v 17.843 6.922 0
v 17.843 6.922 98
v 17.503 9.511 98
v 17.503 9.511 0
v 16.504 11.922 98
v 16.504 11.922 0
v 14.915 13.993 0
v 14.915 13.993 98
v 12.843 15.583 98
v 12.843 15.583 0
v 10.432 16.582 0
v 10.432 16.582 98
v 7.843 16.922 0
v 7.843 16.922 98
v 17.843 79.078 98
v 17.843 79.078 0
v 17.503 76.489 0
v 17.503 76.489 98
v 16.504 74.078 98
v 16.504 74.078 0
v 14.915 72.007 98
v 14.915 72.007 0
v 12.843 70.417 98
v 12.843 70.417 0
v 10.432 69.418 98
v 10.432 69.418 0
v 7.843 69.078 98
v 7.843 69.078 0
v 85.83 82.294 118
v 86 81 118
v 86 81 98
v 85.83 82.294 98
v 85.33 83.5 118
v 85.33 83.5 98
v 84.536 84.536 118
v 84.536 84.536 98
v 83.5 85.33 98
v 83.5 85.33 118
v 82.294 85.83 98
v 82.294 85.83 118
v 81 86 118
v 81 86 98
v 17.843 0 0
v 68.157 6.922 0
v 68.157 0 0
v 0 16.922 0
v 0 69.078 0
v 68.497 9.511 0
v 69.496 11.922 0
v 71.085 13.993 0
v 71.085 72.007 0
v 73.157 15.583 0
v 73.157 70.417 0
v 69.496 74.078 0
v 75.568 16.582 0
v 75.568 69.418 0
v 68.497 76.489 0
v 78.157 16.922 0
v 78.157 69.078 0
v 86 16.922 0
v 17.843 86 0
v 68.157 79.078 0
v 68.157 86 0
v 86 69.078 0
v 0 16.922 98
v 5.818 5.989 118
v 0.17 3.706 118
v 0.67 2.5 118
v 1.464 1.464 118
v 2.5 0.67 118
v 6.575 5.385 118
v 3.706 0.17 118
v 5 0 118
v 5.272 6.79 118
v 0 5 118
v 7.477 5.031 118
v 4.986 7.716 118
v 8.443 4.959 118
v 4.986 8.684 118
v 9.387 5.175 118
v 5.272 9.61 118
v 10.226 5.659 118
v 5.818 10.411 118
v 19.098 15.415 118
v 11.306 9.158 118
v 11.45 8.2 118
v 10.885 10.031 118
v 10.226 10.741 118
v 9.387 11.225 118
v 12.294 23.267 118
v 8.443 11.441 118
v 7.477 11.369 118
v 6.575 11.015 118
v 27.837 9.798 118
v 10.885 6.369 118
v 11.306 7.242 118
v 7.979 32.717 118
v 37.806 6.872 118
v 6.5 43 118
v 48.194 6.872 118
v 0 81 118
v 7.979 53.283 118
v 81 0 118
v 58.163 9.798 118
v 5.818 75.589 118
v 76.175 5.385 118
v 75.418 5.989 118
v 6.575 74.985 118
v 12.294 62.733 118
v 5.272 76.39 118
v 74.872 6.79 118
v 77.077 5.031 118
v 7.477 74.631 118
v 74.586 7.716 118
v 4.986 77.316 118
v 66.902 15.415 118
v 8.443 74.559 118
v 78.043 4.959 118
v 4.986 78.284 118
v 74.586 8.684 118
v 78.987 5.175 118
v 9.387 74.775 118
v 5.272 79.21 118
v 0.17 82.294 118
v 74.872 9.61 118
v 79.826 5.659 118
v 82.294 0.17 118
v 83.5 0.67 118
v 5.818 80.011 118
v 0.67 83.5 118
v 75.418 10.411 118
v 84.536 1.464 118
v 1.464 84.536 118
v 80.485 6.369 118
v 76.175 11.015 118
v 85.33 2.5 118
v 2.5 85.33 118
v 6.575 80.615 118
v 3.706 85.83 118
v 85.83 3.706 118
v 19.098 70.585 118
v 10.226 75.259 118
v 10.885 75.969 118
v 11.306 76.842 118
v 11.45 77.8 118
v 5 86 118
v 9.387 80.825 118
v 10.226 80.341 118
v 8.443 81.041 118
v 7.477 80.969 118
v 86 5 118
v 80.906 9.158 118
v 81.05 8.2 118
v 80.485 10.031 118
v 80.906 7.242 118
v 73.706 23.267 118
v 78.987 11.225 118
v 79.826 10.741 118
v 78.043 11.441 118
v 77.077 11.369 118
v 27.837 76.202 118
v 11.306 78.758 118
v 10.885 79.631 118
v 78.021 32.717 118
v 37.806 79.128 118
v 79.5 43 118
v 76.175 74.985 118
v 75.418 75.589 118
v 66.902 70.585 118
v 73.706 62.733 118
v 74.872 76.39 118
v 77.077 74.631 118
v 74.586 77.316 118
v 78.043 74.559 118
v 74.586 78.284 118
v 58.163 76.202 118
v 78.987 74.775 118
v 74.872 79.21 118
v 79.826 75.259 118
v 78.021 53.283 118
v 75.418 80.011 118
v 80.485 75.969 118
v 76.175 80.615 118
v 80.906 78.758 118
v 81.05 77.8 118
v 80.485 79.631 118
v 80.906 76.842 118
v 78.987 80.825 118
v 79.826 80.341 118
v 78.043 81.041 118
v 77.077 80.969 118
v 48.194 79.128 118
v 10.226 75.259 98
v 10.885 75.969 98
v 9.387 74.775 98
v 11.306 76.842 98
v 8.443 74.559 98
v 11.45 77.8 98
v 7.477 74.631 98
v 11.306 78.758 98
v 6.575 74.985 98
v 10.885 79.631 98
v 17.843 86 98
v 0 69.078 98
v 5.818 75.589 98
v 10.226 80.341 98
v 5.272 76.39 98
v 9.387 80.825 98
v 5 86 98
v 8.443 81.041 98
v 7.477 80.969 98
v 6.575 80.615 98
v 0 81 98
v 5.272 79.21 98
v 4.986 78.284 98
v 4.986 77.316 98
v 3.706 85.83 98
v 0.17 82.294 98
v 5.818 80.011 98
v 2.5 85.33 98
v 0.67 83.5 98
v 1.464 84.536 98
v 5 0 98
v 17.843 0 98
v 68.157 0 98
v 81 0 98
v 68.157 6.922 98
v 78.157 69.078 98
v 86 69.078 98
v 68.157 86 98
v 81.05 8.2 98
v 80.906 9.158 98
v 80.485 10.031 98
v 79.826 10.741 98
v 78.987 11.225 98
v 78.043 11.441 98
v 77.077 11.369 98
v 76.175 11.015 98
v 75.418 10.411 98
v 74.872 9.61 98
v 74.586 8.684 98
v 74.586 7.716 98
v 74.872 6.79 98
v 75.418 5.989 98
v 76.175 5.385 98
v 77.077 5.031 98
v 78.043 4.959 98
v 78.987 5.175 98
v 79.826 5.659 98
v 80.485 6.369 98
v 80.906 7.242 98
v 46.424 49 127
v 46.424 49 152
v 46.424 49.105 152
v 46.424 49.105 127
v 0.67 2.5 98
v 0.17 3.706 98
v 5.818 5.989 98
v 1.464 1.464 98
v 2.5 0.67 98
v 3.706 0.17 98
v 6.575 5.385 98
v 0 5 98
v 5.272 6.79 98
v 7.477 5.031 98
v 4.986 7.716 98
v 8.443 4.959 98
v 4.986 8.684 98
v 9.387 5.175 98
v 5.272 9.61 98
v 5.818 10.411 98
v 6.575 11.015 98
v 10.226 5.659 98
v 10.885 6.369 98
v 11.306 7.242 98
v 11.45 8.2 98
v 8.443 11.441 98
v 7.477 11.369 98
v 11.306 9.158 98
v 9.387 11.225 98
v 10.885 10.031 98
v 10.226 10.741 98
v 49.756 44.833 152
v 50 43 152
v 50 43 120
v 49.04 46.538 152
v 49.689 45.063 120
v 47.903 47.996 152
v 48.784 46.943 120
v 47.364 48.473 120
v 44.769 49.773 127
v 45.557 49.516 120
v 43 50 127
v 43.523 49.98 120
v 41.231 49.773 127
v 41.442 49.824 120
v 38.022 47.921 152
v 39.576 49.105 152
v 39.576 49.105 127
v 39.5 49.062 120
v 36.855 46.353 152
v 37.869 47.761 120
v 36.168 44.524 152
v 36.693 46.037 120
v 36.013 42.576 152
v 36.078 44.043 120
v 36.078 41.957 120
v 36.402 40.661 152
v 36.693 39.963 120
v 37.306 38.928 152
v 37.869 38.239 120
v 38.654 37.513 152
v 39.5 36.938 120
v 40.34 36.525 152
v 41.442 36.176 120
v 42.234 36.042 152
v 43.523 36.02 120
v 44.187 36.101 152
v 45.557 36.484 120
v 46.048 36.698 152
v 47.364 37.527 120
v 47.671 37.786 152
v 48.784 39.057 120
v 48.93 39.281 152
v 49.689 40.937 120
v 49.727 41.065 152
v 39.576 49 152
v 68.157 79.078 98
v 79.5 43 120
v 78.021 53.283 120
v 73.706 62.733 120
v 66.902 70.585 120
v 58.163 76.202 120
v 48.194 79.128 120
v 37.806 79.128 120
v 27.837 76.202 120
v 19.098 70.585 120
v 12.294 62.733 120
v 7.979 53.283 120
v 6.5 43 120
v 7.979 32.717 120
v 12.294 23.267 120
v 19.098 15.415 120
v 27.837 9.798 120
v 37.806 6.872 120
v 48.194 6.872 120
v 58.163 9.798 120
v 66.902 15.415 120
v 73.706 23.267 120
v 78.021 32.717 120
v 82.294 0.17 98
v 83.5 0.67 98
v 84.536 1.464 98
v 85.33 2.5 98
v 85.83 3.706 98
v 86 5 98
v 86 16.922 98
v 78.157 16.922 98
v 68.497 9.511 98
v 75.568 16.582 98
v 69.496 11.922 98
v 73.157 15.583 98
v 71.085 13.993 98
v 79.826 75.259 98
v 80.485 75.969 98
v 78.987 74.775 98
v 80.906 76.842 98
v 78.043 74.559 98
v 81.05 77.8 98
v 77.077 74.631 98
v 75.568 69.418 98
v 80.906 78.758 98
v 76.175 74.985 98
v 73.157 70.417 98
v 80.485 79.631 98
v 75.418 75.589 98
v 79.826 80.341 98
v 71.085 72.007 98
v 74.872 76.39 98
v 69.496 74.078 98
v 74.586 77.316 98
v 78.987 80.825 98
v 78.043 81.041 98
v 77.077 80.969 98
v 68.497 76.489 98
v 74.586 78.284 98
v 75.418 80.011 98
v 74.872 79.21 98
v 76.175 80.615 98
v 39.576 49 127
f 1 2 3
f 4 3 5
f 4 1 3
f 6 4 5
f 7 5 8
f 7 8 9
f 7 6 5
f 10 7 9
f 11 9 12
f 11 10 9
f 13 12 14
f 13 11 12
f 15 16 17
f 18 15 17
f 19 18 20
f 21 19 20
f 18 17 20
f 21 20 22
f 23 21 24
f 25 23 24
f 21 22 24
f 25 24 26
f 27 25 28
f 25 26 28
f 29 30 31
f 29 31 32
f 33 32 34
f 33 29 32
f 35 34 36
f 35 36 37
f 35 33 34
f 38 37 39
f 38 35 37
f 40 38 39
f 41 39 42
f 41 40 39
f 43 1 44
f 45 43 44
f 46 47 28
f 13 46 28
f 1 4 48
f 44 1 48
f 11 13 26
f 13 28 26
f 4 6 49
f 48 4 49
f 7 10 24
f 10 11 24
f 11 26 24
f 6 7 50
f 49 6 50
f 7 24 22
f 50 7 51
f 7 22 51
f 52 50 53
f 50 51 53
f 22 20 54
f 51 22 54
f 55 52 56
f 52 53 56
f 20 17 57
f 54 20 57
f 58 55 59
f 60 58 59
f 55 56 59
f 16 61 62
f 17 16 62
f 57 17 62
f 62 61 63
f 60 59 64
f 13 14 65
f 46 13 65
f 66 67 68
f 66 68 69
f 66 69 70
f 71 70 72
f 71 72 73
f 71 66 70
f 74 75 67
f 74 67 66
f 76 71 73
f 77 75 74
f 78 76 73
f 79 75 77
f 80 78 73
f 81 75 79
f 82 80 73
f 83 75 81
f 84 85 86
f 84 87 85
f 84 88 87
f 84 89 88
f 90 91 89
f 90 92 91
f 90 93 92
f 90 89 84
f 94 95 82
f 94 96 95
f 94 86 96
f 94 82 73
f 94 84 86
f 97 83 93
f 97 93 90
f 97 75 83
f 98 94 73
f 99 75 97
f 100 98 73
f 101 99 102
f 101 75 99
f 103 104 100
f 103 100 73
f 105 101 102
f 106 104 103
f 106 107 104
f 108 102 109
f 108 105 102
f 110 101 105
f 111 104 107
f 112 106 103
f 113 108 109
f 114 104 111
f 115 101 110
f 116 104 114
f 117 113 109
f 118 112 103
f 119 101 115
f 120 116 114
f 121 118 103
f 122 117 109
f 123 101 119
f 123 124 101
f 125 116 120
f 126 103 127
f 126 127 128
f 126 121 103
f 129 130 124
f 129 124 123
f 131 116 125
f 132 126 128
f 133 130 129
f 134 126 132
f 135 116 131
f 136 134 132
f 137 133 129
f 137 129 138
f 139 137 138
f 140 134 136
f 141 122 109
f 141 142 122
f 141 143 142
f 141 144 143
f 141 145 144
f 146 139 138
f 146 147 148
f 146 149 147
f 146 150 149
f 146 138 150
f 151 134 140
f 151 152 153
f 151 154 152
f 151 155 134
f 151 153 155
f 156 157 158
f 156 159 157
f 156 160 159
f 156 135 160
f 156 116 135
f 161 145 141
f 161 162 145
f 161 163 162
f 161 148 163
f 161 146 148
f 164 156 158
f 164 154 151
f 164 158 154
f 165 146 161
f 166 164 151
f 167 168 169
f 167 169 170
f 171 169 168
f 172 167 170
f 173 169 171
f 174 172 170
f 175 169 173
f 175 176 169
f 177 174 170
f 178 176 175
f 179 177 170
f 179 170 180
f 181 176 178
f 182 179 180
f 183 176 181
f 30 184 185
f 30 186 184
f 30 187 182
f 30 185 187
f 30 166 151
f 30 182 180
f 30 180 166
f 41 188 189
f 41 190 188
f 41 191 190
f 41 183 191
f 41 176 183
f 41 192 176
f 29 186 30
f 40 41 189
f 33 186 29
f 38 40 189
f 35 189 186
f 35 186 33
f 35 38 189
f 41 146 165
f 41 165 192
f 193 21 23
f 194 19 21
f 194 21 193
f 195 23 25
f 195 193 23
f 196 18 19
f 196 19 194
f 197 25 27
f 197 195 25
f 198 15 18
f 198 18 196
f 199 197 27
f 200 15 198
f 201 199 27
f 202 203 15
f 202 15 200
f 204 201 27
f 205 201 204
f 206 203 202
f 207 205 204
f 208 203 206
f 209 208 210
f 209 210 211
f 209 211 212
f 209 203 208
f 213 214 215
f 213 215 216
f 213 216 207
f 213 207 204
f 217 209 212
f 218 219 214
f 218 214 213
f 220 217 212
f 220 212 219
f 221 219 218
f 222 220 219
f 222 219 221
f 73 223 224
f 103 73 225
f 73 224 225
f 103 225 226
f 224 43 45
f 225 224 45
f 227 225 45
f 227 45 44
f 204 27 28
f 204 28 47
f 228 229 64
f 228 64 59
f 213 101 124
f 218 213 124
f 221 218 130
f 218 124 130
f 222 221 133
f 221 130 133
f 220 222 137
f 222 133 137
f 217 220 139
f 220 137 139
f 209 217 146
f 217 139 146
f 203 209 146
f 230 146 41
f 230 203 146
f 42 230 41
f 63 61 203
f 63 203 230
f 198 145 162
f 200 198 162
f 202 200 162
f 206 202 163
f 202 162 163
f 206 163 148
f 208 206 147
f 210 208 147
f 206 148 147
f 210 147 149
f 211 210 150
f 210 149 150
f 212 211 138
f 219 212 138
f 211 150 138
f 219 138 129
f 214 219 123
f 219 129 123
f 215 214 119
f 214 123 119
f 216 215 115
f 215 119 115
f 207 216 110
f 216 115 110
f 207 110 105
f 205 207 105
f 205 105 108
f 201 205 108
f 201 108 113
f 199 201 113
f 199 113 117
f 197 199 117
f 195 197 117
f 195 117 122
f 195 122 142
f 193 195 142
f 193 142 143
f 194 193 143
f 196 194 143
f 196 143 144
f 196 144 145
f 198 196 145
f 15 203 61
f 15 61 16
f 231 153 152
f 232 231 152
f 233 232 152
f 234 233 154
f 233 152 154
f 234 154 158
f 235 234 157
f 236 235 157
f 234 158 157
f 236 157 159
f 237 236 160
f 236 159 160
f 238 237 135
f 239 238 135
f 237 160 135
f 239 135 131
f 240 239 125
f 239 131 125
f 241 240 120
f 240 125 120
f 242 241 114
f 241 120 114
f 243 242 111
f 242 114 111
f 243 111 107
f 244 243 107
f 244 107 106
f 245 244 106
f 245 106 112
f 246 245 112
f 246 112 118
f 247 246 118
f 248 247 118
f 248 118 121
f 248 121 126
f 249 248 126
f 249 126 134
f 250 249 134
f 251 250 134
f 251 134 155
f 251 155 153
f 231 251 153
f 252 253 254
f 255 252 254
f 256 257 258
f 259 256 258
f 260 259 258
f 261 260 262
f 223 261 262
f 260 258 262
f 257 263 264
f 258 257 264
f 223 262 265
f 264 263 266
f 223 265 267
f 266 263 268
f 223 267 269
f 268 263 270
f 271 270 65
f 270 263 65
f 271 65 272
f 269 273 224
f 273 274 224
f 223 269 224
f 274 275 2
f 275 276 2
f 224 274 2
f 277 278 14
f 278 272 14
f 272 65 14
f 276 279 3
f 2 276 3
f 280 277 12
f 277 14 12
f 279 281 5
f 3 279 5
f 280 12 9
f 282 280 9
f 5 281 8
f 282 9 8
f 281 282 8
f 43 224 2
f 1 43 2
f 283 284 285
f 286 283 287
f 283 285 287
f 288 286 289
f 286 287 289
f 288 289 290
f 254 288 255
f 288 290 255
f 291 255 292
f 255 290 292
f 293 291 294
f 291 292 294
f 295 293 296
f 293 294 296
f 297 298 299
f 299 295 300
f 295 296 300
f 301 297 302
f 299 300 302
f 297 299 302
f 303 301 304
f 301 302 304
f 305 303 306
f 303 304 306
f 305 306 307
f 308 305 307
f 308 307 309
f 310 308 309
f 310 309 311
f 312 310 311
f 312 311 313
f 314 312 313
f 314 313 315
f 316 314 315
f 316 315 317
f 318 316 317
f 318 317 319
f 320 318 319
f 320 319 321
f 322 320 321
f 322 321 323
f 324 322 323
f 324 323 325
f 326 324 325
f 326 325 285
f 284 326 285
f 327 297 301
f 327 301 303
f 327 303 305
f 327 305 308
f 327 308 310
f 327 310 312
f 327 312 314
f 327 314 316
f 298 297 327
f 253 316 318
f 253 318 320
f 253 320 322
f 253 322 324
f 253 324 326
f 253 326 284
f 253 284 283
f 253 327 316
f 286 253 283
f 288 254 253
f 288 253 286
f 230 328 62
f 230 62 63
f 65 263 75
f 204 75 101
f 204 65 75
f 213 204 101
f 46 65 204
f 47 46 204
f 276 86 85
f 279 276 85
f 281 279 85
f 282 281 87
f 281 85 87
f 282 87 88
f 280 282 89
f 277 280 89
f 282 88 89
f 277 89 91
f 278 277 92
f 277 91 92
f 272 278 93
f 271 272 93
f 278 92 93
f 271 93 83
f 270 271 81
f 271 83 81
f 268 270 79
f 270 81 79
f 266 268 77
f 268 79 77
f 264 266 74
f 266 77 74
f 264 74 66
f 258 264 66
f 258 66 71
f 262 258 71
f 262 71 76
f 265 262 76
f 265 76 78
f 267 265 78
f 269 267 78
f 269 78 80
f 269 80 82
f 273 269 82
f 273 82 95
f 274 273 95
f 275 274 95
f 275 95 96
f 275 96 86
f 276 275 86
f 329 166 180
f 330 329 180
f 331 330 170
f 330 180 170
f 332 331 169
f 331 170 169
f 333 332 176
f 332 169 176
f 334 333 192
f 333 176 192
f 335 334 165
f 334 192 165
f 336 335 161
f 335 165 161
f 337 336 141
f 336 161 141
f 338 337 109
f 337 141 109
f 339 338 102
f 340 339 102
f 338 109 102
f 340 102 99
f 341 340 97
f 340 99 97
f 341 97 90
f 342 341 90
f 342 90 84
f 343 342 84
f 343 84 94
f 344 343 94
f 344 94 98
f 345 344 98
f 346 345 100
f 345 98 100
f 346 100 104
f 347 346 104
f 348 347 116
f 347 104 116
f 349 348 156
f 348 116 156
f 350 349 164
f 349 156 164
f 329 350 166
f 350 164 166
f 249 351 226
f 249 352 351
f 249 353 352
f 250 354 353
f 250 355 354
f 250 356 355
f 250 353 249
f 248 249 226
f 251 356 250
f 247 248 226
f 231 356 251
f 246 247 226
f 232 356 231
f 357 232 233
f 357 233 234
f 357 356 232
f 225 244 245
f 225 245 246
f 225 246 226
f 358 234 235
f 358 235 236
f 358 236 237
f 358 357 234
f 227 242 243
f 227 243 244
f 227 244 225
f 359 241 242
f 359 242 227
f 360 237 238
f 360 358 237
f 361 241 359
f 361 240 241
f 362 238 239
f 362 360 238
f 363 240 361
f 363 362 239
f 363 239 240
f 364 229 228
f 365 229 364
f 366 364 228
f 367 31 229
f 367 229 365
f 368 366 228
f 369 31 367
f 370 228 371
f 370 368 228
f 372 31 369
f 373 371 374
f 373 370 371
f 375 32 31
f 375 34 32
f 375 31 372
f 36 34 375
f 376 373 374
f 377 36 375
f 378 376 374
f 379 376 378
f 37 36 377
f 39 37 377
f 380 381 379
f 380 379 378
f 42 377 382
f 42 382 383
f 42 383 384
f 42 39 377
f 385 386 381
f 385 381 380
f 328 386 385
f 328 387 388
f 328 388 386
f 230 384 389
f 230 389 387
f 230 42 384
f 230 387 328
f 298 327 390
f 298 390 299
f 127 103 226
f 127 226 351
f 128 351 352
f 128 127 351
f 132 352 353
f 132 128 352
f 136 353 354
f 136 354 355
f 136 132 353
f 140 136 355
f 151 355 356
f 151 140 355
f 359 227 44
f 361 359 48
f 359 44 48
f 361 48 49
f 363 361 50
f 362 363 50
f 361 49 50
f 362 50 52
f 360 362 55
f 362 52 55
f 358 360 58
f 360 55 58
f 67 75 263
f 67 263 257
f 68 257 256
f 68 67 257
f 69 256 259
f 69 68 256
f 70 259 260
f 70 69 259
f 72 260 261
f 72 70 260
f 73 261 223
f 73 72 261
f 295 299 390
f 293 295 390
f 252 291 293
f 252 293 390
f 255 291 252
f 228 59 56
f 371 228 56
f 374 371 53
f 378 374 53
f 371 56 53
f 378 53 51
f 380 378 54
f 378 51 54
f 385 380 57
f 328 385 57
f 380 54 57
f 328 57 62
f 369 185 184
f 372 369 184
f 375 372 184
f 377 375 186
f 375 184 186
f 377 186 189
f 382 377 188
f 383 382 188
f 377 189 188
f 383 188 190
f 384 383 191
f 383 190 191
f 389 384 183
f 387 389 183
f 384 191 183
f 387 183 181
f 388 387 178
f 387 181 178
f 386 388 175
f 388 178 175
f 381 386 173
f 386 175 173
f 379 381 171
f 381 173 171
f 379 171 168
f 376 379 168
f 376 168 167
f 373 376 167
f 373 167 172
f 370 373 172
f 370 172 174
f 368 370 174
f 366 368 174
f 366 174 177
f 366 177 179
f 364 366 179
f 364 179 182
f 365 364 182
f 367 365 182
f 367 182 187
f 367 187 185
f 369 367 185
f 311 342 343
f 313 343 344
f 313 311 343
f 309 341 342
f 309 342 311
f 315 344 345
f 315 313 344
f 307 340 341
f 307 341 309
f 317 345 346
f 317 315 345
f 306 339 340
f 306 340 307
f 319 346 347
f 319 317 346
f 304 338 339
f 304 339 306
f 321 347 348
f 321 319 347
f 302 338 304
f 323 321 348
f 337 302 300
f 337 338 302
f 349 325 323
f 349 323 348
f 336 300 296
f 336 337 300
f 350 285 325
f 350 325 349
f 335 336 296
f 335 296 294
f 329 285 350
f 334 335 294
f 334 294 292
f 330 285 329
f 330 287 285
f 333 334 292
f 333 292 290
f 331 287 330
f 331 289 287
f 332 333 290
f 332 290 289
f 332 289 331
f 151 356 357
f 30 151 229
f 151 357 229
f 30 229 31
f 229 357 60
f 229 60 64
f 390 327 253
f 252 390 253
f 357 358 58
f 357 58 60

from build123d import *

# Parameters (mm, degrees)
SKETCH_1_W          = 86
SKETCH_1_H          = 86
EXTRUDE_1_DEPTH     = 118
FILLET_1_R          = 5
SKETCH_2_R          = 36.5
EXTRUDE_2_DEPTH     = 2
SKETCH_3_R          = 7
EXTRUDE_3_DEPTH     = 32
SKETCH_4_W          = 6.847911944
SKETCH_4_H          = 3.276194793
CUT_EXTRUDE_1_DEPTH = 25
SKETCH_5_R          = 3.25
CUT_EXTRUDE_2_DEPTH = 119
CUT_EXTRUDE_3_DEPTH = 98


with BuildPart() as part:
    # 草图1 → 凸台-拉伸1 (new body)
    with BuildSketch(Plane.XY):
        with Locations((43, 43)):
            Rectangle(SKETCH_1_W, SKETCH_1_H)
    extrude(amount=EXTRUDE_1_DEPTH)

    # 圆角1
    fillet_1_edges = [part.edges().sort_by_distance(p)[0] for p in [
        (0, 86, 59),
        (86, 86, 59),
        (86, 0, 59),
        (0, 0, 59),
    ]]
    fillet(fillet_1_edges, radius=FILLET_1_R)

    # 草图2 → 凸台-拉伸2 (add)
    with BuildSketch(Plane.XY.offset(118)):
        with Locations((43, 43)):
            Circle(SKETCH_2_R)
    extrude(amount=EXTRUDE_2_DEPTH)

    # 草图3 → 凸台-拉伸3 (add)
    with BuildSketch(Plane.XY.offset(120)):
        with Locations((43, 43)):
            Circle(SKETCH_3_R)
    extrude(amount=EXTRUDE_3_DEPTH)

    # 草图4 → 切除-拉伸1 (cut)
    with BuildSketch(Plane.XY.offset(152)):
        with Locations((43, 50.638097397)):
            Rectangle(SKETCH_4_W, SKETCH_4_H)
    extrude(amount=-CUT_EXTRUDE_1_DEPTH, mode=Mode.SUBTRACT)

    # 草图5 → 切除-拉伸2 (cut, through all)
    with BuildSketch(Plane.XY.offset(118)):
        with Locations((8.2, 77.8)):
            Circle(SKETCH_5_R)
        with Locations((77.8, 77.8)):
            Circle(SKETCH_5_R)
        with Locations((77.8, 8.2)):
            Circle(SKETCH_5_R)
        with Locations((8.2, 8.2)):
            Circle(SKETCH_5_R)
    extrude(amount=-CUT_EXTRUDE_2_DEPTH, mode=Mode.SUBTRACT)

    # 草图6 → 切除-拉伸3 (cut)
    with BuildSketch(Plane(origin=(0, 0, 0), x_dir=(-1, 0, 0), z_dir=(0, 0, -1))):
        with BuildLine():
            Line((-68.156525259, 86), (-93.025218422, 86))
            Line((-93.025218422, 86), (-93.025218422, 69.077587969))
            Line((-93.025218422, 69.077587969), (-78.156525259, 69.077587969))
            ThreePointArc((-78.156525259, 69.077587969), (-71.085457448, 72.006520157), (-68.156525259, 79.077587969))
            Line((-68.156525259, 79.077587969), (-68.156525259, 86))
        make_face()
        with BuildLine():
            Line((-17.843474741, 86), (-17.843474741, 79.077587969))
            ThreePointArc((-17.843474741, 79.077587969), (-14.914542552, 72.006520157), (-7.843474741, 69.077587969))
            Line((-7.843474741, 69.077587969), (7.025218422, 69.077587969))
            Line((7.025218422, 69.077587969), (7.025218422, 86))
            Line((7.025218422, 86), (-17.843474741, 86))
        make_face()
        with BuildLine():
            Line((-7.843474741, 16.922412031), (7.025218422, 16.922412031))
            Line((7.025218422, 16.922412031), (7.025218422, 0))
            Line((7.025218422, 0), (-17.843474741, 0))
            Line((-17.843474741, 0), (-17.843474741, 6.922412031))
            ThreePointArc((-17.843474741, 6.922412031), (-14.914542552, 13.993479843), (-7.843474741, 16.922412031))
        make_face()
        with BuildLine():
            Line((-68.156525259, 0), (-68.156525259, 6.922412031))
            ThreePointArc((-68.156525259, 6.922412031), (-71.085457448, 13.993479843), (-78.156525259, 16.922412031))
            Line((-78.156525259, 16.922412031), (-93.025218422, 16.922412031))
            Line((-93.025218422, 16.922412031), (-93.025218422, 0))
            Line((-93.025218422, 0), (-68.156525259, 0))
        make_face()
    extrude(amount=-CUT_EXTRUDE_3_DEPTH, mode=Mode.SUBTRACT)


solid = part.part
